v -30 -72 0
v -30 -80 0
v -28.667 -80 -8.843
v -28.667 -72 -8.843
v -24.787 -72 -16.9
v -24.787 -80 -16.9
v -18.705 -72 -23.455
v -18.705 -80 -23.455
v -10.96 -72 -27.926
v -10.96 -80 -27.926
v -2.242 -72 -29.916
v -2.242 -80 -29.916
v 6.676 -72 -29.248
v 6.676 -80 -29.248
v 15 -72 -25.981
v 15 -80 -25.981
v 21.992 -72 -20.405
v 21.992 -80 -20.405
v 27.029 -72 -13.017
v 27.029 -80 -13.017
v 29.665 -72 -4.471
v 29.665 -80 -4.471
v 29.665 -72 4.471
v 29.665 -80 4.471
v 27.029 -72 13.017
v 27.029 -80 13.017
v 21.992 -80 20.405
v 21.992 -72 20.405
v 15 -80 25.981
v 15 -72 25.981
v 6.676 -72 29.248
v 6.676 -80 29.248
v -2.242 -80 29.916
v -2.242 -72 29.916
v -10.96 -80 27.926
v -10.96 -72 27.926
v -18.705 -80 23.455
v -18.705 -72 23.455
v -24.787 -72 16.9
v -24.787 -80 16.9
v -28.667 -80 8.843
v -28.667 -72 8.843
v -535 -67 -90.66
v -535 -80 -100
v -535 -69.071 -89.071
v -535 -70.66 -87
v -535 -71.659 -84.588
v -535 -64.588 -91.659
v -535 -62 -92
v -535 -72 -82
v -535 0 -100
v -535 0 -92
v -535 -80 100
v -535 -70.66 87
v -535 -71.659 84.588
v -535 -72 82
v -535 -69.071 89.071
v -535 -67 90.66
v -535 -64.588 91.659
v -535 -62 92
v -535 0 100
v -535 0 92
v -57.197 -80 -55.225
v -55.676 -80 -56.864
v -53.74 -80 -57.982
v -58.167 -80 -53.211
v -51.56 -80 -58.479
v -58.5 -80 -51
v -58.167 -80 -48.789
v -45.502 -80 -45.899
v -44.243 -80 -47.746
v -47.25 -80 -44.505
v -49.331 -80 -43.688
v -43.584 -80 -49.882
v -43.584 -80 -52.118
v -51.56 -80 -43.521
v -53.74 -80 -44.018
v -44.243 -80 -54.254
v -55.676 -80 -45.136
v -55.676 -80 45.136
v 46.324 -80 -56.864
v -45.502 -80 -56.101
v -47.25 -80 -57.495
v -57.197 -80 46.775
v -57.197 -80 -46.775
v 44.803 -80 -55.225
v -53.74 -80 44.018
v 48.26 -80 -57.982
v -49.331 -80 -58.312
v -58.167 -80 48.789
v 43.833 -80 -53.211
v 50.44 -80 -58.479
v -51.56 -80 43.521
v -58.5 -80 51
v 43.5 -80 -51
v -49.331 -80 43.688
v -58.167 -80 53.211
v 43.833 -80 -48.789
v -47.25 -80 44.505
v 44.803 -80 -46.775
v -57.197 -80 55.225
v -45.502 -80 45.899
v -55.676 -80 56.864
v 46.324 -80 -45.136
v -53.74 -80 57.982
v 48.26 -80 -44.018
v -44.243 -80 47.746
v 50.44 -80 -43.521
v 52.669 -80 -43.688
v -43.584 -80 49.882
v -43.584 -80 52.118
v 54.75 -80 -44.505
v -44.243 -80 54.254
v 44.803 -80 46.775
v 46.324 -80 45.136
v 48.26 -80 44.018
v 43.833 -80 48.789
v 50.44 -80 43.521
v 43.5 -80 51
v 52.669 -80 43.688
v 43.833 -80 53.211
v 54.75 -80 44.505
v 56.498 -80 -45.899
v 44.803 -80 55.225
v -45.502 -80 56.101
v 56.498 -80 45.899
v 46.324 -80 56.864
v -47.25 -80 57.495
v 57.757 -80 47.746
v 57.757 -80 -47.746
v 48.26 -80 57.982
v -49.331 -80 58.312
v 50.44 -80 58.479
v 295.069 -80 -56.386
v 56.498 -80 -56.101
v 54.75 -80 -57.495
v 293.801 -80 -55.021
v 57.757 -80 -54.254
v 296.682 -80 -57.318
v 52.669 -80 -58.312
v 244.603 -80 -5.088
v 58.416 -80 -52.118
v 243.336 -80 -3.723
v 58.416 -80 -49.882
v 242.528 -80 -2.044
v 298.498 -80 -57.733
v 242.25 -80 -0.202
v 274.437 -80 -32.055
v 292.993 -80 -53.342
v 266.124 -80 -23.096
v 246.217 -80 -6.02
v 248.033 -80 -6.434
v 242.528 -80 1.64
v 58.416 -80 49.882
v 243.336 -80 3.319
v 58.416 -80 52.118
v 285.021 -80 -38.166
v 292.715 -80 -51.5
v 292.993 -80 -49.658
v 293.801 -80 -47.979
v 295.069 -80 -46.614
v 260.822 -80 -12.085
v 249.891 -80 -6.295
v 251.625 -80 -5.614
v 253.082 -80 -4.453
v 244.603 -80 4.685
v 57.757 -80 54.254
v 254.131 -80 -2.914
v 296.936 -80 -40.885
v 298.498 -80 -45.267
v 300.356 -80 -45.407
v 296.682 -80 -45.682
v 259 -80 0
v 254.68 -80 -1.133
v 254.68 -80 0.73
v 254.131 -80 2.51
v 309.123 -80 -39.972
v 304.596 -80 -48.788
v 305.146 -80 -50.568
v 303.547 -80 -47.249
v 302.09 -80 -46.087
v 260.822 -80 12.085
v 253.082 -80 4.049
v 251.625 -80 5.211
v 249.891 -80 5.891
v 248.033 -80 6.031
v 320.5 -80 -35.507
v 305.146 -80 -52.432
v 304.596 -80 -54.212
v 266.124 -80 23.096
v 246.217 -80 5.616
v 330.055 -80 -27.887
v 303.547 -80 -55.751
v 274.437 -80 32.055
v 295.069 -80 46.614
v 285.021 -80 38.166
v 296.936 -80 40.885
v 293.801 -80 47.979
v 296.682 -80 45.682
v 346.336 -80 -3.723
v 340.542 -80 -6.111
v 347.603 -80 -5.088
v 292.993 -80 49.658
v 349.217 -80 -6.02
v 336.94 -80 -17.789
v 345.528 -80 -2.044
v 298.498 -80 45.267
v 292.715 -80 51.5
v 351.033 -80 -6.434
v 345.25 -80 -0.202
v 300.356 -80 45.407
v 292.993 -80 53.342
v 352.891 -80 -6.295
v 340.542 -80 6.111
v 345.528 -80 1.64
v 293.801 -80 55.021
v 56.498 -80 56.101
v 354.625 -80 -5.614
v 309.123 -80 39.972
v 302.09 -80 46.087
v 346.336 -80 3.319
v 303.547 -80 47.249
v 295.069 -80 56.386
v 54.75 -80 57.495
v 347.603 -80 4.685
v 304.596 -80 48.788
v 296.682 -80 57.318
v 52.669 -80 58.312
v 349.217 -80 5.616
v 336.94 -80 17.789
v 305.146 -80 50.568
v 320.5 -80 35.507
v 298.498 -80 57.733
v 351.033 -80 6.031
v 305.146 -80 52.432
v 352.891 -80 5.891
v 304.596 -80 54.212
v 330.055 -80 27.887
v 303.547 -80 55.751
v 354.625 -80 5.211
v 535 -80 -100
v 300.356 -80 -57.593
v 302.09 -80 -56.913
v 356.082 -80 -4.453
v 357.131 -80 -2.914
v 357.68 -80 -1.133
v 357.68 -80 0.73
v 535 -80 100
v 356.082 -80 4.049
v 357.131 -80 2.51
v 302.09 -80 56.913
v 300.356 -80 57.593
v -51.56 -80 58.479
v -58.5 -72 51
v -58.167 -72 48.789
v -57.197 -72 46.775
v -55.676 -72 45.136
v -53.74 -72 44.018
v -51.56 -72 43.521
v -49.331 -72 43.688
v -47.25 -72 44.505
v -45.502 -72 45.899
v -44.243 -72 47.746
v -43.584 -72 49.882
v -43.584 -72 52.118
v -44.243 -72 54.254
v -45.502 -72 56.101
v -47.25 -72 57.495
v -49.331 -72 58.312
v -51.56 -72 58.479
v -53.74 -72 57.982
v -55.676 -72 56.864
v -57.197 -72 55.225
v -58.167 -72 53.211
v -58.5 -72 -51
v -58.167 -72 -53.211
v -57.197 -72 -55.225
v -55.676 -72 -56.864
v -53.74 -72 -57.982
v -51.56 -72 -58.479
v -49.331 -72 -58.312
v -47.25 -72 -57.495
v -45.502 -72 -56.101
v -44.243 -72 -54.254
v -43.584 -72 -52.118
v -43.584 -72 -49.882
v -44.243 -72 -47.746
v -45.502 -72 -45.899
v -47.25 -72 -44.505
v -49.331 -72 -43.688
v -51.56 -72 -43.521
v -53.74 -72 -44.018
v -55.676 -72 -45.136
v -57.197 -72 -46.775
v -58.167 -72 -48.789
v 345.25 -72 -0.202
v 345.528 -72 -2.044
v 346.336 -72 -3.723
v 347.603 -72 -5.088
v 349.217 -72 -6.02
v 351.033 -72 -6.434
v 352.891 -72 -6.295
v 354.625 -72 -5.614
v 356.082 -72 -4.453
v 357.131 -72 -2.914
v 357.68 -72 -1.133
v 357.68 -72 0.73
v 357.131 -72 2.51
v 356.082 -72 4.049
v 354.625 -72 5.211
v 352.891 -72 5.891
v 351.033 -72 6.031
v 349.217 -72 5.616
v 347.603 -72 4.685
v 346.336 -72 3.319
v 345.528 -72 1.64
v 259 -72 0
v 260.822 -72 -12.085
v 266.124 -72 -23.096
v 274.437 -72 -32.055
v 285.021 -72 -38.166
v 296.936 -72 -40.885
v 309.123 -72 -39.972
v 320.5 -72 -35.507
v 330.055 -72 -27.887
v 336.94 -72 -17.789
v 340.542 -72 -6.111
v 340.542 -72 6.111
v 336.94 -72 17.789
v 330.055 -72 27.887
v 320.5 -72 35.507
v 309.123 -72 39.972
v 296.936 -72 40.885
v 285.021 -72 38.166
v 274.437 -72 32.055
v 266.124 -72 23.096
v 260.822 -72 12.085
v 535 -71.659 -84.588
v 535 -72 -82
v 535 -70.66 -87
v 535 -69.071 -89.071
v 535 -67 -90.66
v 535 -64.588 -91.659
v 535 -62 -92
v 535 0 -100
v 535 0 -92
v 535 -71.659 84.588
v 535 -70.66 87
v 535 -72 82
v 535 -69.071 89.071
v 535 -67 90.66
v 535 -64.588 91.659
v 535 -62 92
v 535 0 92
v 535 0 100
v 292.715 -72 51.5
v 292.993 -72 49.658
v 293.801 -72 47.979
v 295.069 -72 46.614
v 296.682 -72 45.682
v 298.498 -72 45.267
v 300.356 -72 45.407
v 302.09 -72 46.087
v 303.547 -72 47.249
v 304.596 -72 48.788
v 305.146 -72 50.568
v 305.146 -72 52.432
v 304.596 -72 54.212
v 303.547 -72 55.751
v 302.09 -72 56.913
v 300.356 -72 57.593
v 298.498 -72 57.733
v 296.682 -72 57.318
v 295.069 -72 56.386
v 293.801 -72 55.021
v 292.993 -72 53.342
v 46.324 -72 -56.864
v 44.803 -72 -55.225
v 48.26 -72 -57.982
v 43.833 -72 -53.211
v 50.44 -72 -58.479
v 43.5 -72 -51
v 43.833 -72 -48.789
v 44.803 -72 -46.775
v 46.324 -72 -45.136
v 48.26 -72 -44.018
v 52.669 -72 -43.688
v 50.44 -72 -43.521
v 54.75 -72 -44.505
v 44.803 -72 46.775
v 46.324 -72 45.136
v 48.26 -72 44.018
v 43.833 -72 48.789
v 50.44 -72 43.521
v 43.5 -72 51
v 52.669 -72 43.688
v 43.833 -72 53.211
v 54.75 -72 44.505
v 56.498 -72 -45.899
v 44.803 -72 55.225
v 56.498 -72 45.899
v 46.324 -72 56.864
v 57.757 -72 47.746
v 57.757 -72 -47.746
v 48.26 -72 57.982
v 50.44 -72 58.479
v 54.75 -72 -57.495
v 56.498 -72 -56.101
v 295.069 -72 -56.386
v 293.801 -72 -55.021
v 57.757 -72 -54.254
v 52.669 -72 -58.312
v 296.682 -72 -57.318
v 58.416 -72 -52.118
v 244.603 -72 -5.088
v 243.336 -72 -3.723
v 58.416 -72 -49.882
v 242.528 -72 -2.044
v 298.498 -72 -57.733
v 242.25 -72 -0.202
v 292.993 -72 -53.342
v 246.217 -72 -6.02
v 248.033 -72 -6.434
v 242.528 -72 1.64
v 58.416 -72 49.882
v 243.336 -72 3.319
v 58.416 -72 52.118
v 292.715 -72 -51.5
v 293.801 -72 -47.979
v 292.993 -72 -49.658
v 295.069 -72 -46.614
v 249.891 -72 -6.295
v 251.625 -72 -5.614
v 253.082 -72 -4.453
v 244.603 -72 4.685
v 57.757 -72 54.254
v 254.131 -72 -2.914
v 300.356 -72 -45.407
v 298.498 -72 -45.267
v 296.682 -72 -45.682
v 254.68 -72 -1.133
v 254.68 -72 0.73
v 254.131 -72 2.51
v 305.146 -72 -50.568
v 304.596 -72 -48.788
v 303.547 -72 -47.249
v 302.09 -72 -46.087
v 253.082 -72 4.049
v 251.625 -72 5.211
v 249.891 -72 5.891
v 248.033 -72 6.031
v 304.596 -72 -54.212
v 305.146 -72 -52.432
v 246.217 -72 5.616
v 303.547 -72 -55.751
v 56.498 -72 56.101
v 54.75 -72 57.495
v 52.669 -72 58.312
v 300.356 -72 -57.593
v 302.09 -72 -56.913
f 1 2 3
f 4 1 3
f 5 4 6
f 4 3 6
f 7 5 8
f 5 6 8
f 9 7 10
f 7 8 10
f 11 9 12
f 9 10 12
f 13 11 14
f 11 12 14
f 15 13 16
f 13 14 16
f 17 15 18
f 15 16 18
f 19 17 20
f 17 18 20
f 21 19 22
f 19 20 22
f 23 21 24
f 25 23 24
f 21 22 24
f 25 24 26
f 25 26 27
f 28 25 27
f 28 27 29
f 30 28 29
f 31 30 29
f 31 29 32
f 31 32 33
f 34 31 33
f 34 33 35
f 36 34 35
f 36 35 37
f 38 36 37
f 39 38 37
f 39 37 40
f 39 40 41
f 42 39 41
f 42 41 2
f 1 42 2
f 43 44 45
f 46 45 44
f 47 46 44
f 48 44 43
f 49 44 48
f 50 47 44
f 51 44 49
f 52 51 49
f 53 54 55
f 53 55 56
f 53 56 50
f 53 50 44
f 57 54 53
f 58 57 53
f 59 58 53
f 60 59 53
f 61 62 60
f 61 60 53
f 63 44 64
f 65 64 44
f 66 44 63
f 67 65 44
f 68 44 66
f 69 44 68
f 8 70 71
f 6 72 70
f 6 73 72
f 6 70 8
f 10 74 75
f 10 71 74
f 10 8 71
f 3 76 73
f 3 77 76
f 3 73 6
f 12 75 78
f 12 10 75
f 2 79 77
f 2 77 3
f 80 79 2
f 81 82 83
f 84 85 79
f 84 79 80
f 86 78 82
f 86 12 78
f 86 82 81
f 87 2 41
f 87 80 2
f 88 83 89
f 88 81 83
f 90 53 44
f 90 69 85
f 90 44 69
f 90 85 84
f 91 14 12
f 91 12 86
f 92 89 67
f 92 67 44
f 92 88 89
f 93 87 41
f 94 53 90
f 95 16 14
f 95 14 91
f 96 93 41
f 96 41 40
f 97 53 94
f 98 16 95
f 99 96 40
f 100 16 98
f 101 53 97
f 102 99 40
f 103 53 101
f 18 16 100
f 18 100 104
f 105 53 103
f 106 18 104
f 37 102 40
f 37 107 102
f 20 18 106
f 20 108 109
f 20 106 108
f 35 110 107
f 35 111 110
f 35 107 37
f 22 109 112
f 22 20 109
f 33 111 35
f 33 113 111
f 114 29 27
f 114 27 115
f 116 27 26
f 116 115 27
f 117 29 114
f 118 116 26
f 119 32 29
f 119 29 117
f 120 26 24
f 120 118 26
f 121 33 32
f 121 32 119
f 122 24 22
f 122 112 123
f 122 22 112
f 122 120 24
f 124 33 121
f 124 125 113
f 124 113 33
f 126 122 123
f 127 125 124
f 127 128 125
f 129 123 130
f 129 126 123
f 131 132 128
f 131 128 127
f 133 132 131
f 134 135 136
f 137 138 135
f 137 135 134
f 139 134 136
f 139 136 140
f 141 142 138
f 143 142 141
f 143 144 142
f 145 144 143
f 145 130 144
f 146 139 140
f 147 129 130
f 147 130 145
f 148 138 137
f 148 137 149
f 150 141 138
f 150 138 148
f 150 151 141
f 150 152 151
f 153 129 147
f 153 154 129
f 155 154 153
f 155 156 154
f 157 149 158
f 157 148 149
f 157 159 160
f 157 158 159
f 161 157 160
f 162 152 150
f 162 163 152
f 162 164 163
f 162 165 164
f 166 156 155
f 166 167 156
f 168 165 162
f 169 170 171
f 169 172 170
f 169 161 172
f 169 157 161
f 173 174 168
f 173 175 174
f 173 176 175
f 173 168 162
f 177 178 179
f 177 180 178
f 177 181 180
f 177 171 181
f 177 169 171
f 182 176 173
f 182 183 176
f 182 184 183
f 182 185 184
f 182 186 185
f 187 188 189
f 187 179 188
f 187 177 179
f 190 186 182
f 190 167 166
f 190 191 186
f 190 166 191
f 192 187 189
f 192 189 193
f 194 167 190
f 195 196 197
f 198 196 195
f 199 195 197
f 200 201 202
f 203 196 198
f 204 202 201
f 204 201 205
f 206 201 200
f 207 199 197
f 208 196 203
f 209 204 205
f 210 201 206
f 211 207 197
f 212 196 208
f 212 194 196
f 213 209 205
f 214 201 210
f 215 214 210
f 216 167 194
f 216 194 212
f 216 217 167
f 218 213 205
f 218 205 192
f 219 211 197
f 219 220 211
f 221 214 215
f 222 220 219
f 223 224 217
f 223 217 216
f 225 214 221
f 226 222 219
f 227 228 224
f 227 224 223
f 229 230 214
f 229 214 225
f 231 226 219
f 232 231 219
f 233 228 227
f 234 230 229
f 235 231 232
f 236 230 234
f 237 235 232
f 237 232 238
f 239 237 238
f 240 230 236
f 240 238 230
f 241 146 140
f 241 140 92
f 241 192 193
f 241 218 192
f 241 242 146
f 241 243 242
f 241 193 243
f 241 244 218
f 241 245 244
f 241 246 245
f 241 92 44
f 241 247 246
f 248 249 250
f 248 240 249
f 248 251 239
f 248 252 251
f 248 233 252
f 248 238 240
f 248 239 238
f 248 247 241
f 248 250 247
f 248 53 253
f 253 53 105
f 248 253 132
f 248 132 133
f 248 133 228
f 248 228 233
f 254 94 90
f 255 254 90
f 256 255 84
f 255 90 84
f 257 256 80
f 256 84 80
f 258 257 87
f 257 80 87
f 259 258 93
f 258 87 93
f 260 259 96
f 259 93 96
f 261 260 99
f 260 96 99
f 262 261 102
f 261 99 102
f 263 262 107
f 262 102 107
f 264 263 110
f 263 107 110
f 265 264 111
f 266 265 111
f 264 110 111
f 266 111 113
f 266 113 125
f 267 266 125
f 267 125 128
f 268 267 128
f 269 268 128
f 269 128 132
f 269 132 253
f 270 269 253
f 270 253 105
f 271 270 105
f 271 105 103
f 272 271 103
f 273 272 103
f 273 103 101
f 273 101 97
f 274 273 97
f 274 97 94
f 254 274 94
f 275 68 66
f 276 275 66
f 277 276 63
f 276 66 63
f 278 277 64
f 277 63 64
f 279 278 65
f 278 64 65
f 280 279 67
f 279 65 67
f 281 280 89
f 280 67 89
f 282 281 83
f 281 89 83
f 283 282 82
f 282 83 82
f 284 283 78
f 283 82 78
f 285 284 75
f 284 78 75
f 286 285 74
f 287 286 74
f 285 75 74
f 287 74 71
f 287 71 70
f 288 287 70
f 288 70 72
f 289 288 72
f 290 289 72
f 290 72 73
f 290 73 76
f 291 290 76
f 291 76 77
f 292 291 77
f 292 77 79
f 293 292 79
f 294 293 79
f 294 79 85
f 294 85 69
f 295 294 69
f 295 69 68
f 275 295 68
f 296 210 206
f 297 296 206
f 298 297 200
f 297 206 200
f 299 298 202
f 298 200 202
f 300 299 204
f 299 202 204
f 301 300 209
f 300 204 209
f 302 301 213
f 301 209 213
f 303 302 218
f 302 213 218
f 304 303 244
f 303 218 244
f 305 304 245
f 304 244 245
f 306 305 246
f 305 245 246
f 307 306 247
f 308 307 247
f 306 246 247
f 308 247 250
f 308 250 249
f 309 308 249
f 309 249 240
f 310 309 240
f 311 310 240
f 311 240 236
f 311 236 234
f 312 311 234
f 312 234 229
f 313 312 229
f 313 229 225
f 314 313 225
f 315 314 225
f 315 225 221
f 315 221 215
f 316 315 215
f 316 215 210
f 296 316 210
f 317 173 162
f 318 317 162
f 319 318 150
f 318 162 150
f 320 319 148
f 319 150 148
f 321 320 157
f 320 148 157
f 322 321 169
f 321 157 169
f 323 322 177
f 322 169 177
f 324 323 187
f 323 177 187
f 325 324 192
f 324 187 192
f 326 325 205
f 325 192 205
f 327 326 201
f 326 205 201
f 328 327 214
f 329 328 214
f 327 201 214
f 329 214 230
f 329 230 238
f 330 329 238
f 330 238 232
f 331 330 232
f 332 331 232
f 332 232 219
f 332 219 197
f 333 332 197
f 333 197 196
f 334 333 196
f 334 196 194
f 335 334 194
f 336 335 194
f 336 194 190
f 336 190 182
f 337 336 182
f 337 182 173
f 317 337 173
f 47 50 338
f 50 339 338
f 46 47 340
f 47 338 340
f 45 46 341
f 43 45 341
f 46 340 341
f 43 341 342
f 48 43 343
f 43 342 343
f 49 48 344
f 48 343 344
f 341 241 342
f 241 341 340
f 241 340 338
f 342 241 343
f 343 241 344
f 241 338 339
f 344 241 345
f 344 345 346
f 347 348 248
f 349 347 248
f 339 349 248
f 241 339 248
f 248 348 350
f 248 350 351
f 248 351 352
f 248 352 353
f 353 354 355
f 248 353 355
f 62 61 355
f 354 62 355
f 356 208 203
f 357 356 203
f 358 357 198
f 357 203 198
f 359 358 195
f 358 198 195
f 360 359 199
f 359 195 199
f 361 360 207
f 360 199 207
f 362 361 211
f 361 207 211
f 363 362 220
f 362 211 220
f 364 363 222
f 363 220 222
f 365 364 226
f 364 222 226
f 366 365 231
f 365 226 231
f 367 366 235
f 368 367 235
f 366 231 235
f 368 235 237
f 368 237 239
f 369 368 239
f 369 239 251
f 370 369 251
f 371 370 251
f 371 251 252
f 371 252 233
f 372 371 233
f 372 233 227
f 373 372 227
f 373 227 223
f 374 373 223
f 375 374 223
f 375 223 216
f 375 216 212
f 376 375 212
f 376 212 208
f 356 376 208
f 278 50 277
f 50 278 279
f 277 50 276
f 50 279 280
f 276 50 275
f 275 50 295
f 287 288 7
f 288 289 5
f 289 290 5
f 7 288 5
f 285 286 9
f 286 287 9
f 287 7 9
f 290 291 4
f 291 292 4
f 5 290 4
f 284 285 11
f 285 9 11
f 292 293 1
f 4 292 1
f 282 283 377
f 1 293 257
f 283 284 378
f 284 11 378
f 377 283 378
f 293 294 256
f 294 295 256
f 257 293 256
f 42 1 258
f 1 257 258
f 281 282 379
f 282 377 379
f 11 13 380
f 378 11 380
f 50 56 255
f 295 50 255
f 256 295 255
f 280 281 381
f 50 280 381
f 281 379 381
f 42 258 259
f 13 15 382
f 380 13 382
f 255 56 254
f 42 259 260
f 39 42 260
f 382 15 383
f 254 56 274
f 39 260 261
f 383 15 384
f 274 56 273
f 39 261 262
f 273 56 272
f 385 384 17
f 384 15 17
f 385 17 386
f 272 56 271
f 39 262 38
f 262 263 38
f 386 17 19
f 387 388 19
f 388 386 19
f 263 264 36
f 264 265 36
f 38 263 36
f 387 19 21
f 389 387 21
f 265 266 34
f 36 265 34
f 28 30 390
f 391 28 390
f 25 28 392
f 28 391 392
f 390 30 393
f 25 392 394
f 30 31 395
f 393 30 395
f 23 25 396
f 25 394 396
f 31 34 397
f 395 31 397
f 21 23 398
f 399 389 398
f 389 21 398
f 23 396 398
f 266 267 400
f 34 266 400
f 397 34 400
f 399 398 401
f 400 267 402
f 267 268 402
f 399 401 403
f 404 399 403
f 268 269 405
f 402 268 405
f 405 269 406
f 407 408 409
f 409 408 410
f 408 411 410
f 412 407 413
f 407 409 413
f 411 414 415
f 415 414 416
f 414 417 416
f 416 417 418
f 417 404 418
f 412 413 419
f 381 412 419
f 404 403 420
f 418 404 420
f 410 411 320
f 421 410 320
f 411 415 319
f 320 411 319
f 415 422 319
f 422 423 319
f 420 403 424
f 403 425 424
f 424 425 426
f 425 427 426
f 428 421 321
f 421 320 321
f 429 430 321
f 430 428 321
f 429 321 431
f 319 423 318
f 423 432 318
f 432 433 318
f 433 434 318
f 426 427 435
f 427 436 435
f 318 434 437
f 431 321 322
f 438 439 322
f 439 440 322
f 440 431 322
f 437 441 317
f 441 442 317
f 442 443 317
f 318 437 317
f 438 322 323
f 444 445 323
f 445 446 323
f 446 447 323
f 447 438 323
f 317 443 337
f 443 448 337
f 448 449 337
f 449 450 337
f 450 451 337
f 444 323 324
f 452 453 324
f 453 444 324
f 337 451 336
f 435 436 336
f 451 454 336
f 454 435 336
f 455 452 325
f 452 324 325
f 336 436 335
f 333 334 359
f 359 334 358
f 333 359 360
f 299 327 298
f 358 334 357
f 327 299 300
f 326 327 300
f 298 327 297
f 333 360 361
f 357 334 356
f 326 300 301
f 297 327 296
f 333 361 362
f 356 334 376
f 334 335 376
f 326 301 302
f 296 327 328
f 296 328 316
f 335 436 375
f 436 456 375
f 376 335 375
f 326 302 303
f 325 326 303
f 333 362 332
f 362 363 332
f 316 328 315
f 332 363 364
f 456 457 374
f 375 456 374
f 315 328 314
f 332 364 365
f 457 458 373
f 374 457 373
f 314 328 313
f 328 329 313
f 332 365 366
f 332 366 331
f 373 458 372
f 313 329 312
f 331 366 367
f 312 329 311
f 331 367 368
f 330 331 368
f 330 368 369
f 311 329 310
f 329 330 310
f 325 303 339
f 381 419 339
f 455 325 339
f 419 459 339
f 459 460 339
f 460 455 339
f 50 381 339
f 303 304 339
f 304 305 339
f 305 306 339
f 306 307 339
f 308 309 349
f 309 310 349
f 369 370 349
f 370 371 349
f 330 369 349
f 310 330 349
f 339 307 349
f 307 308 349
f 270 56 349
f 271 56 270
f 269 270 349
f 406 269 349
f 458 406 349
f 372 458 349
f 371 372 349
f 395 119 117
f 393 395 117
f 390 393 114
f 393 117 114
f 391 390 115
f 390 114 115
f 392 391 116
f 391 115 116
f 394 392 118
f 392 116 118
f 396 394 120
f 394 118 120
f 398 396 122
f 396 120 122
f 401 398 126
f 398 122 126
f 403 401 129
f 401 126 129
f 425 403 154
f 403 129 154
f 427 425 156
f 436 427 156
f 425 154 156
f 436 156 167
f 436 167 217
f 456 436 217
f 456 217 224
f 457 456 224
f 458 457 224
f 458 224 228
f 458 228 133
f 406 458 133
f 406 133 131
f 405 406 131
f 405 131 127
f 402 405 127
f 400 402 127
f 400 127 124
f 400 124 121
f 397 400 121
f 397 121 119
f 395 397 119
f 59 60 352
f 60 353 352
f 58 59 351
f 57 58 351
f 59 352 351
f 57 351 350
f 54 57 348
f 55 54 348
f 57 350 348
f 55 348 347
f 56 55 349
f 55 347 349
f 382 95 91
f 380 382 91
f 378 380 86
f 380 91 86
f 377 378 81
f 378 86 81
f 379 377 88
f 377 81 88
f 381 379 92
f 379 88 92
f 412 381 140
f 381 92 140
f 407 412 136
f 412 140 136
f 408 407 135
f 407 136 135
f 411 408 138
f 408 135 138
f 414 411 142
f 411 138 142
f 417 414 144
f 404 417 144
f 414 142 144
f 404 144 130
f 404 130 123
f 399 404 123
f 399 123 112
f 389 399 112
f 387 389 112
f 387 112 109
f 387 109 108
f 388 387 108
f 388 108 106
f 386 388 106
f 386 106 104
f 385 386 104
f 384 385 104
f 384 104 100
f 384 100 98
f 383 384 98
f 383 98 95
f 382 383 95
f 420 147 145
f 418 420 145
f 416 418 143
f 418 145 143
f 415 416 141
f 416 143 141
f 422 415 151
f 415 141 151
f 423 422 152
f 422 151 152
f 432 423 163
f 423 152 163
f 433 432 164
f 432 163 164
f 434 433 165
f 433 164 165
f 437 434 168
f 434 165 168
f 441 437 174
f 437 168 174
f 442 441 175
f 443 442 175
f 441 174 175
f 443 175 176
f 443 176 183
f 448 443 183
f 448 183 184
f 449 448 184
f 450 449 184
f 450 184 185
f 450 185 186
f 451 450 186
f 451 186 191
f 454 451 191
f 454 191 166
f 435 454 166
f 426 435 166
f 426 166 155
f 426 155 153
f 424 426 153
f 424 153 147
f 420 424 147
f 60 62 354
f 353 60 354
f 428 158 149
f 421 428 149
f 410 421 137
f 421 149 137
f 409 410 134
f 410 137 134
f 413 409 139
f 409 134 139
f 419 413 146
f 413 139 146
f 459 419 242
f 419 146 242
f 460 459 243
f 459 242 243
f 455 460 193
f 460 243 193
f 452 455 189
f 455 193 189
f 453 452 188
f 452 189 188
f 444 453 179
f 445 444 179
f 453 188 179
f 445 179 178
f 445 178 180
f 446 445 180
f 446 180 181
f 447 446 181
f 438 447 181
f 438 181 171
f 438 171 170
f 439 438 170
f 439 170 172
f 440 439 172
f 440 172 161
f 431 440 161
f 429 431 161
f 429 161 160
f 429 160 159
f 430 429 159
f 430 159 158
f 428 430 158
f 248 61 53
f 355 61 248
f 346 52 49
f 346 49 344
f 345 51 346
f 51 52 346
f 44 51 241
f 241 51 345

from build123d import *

# Parameters (mm, degrees)
F0_W     = 1070
F0_H     = 200
F1_DEPTH = 80
F2_T     = -8
F3_D     = 60
F4_R     = 10
F5_D     = 15
F6_D     = 82
F7_D     = 12.5


with BuildPart() as f1:
    # F0 (on Front) → F1 (new body)
    with BuildSketch(Plane.XZ):
        Rectangle(F0_W, F0_H)
    extrude(amount=F1_DEPTH)

    # F2
    f2_openings = [f1.faces().sort_by_distance(p)[0] for p in [
        (0, 0, 0),
        (-535, -40, 0),
        (535, -40, 0),
    ]]
    offset(amount=F2_T, openings=f2_openings)

    # F3 (through all)
    with Locations(Plane(origin=(0, 0, 0), x_dir=(1, 0, 0), z_dir=(0, 1, 0))):
        with Locations((0, 0)):
            Hole(F3_D / 2)

    # F4
    f4_edges = [f1.edges().sort_by_distance(p)[0] for p in [
        (0, -72, -92),
        (0, -72, 92),
    ]]
    fillet(f4_edges, radius=F4_R)

    # F5 (through all)
    with Locations(Plane(origin=(0, 0, 0), x_dir=(1, 0, 0), z_dir=(0, 1, 0))):
        with Locations((-51, -51), (51, -51), (51, 51), (-51, 51)):
            Hole(F5_D / 2)

    # F6 (through all)
    with Locations(Plane(origin=(0, 0, 0), x_dir=(1, 0, 0), z_dir=(0, 1, 0))):
        with Locations((300, 0)):
            Hole(F6_D / 2)

    # F7 (through all)
    with Locations(Plane(origin=(0, 0, 0), x_dir=(1, 0, 0), z_dir=(0, 1, 0))):
        with Locations((248.5, 0.2018298983), (298.9653646946, -51.5), (351.5, 0.2018298983), (298.9653646946, 51.5)):
            Hole(F7_D / 2)


solid = f1.part
